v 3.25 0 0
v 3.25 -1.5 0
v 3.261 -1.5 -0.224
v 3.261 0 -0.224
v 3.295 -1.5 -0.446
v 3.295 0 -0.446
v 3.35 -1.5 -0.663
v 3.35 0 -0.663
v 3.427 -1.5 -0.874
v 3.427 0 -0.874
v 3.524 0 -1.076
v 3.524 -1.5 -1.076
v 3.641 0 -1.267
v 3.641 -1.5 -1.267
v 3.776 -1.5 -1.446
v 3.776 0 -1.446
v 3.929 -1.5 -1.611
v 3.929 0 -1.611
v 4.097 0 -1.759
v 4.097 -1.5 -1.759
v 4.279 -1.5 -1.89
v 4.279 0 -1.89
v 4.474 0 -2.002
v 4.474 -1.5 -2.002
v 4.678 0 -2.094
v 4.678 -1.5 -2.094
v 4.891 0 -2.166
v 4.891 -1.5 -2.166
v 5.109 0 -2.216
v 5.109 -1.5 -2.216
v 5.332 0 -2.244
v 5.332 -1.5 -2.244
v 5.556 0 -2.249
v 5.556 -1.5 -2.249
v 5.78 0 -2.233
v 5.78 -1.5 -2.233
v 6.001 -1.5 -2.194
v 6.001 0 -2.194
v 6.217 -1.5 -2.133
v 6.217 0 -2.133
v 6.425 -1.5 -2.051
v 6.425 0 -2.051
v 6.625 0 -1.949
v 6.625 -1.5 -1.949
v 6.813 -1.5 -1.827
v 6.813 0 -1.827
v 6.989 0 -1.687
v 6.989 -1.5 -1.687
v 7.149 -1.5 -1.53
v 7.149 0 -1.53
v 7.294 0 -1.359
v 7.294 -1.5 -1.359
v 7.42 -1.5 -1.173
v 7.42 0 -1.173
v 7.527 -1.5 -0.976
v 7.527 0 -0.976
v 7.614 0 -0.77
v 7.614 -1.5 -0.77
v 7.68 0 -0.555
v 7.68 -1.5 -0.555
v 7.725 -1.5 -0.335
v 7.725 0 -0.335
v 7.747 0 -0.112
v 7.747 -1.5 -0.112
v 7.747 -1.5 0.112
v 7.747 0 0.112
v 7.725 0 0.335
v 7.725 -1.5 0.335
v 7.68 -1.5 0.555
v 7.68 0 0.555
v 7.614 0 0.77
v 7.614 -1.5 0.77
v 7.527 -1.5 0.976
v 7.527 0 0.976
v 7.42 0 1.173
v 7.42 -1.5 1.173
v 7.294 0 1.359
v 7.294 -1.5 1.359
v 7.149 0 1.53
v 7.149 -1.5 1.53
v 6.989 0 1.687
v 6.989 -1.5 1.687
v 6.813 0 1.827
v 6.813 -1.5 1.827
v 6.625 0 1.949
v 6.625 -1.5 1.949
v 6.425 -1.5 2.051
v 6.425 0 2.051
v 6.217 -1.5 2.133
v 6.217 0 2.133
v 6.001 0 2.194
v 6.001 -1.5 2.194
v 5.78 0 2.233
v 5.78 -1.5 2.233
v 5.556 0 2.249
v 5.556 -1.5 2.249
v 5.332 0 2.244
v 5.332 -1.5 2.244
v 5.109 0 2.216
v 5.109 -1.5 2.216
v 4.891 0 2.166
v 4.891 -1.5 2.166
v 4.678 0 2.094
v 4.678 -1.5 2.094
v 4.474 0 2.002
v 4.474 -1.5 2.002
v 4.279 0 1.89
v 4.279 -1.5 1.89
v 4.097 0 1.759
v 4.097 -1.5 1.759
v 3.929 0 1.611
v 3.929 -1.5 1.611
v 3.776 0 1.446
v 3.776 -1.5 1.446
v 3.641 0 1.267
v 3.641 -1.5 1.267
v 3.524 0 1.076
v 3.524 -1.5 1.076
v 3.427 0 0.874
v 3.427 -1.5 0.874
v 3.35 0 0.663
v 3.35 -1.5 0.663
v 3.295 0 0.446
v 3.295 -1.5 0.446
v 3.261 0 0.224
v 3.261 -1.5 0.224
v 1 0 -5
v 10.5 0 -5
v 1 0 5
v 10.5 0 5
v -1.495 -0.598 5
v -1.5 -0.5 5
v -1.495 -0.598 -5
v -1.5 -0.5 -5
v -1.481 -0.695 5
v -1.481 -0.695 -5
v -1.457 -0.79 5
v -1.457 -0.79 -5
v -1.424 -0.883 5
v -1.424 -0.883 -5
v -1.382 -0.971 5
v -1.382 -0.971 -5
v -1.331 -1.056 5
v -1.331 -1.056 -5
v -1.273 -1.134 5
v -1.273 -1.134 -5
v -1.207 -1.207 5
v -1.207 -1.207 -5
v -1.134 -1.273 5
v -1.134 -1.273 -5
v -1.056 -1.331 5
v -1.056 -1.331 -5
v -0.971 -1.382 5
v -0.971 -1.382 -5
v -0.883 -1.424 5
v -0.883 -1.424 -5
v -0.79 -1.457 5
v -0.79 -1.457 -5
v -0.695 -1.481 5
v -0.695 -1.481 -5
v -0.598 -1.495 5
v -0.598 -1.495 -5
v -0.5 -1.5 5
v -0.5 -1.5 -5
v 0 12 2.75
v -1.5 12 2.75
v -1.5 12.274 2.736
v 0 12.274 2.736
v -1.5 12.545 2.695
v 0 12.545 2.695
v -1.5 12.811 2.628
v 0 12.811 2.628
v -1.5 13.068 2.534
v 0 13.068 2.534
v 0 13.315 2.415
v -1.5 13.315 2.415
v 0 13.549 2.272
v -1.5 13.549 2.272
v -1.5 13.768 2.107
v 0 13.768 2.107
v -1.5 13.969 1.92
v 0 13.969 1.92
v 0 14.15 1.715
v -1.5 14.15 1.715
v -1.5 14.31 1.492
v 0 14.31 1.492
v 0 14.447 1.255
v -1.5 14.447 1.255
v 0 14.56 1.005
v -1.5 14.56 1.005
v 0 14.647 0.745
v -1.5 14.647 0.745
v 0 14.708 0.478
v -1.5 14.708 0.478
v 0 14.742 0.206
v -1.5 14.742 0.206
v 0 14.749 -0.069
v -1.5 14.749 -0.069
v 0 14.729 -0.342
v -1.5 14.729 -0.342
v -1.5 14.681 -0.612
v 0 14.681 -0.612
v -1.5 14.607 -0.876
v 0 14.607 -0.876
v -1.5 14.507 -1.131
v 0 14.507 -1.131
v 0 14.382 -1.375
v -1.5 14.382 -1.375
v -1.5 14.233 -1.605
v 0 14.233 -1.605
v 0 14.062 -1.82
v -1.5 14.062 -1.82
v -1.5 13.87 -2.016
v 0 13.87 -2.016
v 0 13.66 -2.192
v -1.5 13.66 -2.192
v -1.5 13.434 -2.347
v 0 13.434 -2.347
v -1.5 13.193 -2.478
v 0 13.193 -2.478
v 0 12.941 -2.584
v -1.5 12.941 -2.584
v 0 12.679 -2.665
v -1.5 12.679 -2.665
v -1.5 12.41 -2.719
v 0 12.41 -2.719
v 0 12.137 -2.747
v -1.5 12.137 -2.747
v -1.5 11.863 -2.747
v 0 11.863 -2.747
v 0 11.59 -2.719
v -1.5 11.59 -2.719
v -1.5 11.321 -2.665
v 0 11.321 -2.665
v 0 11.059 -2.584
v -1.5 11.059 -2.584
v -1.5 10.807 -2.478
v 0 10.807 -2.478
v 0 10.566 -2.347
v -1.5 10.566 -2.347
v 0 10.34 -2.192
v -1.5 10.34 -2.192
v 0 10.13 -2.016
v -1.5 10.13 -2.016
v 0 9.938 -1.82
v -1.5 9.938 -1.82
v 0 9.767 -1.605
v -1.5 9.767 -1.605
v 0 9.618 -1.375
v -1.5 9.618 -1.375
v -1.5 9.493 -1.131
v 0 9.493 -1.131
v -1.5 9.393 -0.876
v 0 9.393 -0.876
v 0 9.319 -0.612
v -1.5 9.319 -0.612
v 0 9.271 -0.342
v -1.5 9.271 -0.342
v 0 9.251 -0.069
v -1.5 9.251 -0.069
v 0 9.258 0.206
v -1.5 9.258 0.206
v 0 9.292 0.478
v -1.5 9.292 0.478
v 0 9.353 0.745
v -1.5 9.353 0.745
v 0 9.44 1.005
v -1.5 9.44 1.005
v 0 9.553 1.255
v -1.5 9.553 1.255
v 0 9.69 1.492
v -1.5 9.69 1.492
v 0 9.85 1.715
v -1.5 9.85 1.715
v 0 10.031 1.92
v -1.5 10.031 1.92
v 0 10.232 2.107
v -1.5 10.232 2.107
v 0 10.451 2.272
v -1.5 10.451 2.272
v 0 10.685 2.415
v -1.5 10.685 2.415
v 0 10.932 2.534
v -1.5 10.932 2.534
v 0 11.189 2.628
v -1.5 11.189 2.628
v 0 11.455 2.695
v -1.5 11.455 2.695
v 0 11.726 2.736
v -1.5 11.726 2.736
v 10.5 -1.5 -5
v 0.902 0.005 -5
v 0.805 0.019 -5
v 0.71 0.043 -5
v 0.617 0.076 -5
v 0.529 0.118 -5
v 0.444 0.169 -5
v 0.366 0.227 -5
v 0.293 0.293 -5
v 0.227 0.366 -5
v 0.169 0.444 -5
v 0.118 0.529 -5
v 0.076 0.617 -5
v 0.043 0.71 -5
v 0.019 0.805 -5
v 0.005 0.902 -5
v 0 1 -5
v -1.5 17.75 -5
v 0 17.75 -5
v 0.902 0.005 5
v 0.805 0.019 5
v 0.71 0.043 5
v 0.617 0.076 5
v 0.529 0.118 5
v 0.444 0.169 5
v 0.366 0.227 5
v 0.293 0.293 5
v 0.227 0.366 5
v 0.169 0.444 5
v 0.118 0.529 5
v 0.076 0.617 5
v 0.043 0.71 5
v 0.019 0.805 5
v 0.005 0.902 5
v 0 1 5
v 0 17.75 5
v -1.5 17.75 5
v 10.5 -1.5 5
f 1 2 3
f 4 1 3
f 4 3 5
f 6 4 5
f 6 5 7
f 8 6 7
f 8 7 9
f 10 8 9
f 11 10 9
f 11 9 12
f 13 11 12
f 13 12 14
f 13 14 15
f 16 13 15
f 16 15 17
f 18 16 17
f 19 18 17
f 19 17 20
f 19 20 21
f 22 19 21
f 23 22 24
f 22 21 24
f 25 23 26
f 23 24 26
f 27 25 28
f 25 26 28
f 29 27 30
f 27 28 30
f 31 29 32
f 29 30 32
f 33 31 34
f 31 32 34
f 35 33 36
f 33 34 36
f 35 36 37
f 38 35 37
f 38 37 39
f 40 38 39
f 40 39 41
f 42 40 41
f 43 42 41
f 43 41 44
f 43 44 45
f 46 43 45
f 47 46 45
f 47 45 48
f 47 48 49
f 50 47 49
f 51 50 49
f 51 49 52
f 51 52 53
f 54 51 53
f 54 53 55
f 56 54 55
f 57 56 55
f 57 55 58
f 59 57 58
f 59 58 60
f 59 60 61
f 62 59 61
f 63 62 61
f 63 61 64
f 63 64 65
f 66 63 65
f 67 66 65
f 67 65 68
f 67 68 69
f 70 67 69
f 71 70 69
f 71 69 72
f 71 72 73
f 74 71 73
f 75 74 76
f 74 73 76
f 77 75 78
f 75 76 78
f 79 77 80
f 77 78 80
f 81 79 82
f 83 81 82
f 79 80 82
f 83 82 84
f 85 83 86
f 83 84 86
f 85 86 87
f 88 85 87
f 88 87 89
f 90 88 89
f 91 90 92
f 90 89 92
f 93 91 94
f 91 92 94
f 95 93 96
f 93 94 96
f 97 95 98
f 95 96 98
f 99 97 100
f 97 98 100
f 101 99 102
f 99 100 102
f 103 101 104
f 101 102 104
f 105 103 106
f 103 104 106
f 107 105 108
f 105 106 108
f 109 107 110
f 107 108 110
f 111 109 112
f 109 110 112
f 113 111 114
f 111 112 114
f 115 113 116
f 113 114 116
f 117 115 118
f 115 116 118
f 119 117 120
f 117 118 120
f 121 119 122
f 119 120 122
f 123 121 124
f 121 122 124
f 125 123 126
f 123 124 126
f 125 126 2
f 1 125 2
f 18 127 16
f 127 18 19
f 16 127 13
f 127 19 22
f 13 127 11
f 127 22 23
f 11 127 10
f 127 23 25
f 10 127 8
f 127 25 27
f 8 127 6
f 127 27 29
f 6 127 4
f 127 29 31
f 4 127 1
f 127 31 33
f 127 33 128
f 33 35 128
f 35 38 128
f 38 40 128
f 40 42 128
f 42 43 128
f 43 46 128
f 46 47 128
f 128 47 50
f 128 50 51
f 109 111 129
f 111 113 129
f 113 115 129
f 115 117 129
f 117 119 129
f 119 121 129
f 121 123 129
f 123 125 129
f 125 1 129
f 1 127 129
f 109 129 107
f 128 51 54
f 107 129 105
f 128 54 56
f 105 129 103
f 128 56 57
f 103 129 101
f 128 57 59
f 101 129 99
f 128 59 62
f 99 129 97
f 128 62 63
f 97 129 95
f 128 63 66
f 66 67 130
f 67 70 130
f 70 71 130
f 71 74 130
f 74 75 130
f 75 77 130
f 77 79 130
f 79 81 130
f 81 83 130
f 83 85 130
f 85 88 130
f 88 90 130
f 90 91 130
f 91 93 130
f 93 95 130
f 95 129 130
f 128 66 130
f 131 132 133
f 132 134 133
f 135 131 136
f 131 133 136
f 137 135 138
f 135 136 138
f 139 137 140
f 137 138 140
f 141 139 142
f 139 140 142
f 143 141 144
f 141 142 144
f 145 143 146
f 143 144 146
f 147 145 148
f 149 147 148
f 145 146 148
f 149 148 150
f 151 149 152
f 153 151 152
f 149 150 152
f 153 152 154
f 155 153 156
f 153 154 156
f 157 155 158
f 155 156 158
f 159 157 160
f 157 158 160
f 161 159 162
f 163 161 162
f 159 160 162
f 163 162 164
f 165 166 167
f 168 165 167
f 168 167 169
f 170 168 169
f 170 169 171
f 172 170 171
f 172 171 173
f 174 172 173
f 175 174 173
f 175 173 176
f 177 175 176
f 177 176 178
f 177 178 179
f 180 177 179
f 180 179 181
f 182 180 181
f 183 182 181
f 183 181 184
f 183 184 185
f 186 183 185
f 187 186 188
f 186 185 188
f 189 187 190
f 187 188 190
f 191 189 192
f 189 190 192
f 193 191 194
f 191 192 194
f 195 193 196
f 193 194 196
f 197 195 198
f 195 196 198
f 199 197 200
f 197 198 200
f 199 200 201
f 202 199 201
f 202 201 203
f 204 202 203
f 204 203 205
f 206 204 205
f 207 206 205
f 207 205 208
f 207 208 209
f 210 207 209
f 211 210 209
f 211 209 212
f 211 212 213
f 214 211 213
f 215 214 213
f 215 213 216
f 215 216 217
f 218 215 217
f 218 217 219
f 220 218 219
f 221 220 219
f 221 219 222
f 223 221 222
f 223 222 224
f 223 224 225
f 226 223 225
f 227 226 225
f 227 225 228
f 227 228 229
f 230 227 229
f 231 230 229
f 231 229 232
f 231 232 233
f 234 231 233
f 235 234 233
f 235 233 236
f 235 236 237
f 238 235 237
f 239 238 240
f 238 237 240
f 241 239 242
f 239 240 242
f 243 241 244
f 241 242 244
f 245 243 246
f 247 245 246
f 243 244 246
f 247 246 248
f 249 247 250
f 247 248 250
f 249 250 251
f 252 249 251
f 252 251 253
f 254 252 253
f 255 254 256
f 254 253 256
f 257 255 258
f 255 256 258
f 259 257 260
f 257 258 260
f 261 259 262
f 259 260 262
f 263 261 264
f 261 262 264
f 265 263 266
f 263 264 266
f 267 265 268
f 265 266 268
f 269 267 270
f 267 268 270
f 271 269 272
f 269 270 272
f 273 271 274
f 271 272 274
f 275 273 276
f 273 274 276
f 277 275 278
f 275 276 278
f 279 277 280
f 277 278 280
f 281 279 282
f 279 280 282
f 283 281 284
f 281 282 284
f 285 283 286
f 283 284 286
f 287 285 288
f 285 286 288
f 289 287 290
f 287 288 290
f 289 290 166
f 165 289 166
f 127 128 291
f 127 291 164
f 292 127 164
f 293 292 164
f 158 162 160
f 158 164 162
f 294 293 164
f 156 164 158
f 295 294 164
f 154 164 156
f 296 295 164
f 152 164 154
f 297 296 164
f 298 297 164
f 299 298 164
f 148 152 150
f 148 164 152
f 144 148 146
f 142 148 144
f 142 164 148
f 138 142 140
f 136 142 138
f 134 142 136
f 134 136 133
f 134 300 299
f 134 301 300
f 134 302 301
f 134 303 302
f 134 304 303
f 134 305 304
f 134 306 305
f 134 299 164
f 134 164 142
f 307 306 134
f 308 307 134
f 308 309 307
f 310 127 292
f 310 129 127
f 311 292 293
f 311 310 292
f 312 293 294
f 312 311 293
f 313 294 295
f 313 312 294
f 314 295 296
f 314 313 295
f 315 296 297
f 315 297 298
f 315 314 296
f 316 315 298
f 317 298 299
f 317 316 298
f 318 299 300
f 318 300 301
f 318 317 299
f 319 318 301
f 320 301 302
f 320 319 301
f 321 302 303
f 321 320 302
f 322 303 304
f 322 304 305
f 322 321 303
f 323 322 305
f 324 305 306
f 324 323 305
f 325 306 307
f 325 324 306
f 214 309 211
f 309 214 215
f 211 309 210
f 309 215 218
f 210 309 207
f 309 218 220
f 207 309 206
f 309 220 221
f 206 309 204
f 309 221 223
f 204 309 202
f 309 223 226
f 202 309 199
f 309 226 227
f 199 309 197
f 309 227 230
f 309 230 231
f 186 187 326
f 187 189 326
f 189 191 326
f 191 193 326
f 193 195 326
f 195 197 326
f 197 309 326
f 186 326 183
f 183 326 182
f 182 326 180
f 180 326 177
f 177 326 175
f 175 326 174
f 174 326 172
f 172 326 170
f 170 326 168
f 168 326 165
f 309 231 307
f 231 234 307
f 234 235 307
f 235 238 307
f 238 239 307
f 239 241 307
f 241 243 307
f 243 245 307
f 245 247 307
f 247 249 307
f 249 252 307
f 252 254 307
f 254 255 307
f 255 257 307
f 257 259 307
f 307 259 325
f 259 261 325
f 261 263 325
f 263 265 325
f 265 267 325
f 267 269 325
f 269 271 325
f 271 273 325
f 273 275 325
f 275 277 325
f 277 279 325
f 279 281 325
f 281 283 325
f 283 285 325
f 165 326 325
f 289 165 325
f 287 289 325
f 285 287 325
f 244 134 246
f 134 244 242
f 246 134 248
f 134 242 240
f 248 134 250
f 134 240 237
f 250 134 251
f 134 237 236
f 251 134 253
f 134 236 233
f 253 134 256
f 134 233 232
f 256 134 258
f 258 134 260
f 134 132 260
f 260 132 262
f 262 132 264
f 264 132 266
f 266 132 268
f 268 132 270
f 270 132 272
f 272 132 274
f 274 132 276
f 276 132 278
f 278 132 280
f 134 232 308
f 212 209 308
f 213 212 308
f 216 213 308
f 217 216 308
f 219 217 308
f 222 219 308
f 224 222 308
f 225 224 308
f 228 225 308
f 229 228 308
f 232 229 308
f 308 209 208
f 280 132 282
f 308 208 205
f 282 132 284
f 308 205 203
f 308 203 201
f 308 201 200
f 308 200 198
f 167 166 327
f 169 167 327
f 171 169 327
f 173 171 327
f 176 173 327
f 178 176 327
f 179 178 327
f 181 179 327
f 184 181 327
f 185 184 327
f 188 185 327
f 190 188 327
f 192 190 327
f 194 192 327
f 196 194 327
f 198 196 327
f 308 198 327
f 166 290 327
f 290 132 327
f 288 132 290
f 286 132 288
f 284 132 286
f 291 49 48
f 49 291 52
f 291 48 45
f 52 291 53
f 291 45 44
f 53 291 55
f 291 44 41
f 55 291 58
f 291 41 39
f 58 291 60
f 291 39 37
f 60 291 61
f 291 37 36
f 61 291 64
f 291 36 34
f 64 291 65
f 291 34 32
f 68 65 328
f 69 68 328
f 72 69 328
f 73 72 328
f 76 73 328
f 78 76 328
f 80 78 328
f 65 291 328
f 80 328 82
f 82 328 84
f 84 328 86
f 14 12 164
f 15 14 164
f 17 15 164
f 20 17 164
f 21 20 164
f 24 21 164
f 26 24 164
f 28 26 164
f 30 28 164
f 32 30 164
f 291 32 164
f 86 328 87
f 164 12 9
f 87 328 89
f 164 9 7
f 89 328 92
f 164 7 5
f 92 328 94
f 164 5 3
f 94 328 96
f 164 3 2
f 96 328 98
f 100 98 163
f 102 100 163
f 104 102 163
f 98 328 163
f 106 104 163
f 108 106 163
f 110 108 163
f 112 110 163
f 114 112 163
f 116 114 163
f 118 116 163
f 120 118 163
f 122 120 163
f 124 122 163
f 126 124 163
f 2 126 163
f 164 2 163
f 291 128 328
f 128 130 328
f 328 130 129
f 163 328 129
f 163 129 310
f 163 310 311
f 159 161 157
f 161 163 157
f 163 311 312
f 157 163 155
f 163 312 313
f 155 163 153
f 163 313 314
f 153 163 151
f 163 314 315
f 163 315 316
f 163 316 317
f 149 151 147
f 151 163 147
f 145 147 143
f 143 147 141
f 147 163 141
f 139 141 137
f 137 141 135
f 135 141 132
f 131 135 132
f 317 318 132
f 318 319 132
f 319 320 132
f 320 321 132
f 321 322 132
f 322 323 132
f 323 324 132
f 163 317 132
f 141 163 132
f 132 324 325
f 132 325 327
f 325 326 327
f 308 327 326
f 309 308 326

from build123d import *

# Parameters (mm, degrees)
BOSS_EXTRU_1_DEPTH              = 5
CONG_1_R                        = 1
DIAM_TRE_DU_PER_AGE_5_5_5_5_1_D = 5.5
D_GAGEMENT_M41_D                = 4.5


with BuildPart() as part:
    # Esquisse1 → Boss.-Extru.1 (new, symmetric)
    with BuildSketch(Plane.XY):
        Polygon((0, 0), (10.5, 0), (10.5, -1.5), (-1.5, -1.5), (-1.5, 17.75), (0, 17.75), align=None)
    extrude(amount=BOSS_EXTRU_1_DEPTH, both=True)

    # Congé1
    cong_1_edges = [part.edges().sort_by_distance(p)[0] for p in [
        (0, 0, 0),
        (-1.5, -1.5, 0),
    ]]
    fillet(cong_1_edges, radius=CONG_1_R)

    # Diamètre du perçage Ø5.5 (5.5)1 (through all)
    with Locations(Plane(origin=(0, 0, 0), x_dir=(0, 0, -1), z_dir=(1, 0, 0))):
        with Locations((0, 12)):
            Hole(DIAM_TRE_DU_PER_AGE_5_5_5_5_1_D / 2)

    # Dégagement M41 (through all)
    with Locations(Plane(origin=(0, 0, 0), x_dir=(1, 0, 0), z_dir=(0, 1, 0))):
        with Locations((5.5, 0)):
            Hole(D_GAGEMENT_M41_D / 2)


solid = part.part
